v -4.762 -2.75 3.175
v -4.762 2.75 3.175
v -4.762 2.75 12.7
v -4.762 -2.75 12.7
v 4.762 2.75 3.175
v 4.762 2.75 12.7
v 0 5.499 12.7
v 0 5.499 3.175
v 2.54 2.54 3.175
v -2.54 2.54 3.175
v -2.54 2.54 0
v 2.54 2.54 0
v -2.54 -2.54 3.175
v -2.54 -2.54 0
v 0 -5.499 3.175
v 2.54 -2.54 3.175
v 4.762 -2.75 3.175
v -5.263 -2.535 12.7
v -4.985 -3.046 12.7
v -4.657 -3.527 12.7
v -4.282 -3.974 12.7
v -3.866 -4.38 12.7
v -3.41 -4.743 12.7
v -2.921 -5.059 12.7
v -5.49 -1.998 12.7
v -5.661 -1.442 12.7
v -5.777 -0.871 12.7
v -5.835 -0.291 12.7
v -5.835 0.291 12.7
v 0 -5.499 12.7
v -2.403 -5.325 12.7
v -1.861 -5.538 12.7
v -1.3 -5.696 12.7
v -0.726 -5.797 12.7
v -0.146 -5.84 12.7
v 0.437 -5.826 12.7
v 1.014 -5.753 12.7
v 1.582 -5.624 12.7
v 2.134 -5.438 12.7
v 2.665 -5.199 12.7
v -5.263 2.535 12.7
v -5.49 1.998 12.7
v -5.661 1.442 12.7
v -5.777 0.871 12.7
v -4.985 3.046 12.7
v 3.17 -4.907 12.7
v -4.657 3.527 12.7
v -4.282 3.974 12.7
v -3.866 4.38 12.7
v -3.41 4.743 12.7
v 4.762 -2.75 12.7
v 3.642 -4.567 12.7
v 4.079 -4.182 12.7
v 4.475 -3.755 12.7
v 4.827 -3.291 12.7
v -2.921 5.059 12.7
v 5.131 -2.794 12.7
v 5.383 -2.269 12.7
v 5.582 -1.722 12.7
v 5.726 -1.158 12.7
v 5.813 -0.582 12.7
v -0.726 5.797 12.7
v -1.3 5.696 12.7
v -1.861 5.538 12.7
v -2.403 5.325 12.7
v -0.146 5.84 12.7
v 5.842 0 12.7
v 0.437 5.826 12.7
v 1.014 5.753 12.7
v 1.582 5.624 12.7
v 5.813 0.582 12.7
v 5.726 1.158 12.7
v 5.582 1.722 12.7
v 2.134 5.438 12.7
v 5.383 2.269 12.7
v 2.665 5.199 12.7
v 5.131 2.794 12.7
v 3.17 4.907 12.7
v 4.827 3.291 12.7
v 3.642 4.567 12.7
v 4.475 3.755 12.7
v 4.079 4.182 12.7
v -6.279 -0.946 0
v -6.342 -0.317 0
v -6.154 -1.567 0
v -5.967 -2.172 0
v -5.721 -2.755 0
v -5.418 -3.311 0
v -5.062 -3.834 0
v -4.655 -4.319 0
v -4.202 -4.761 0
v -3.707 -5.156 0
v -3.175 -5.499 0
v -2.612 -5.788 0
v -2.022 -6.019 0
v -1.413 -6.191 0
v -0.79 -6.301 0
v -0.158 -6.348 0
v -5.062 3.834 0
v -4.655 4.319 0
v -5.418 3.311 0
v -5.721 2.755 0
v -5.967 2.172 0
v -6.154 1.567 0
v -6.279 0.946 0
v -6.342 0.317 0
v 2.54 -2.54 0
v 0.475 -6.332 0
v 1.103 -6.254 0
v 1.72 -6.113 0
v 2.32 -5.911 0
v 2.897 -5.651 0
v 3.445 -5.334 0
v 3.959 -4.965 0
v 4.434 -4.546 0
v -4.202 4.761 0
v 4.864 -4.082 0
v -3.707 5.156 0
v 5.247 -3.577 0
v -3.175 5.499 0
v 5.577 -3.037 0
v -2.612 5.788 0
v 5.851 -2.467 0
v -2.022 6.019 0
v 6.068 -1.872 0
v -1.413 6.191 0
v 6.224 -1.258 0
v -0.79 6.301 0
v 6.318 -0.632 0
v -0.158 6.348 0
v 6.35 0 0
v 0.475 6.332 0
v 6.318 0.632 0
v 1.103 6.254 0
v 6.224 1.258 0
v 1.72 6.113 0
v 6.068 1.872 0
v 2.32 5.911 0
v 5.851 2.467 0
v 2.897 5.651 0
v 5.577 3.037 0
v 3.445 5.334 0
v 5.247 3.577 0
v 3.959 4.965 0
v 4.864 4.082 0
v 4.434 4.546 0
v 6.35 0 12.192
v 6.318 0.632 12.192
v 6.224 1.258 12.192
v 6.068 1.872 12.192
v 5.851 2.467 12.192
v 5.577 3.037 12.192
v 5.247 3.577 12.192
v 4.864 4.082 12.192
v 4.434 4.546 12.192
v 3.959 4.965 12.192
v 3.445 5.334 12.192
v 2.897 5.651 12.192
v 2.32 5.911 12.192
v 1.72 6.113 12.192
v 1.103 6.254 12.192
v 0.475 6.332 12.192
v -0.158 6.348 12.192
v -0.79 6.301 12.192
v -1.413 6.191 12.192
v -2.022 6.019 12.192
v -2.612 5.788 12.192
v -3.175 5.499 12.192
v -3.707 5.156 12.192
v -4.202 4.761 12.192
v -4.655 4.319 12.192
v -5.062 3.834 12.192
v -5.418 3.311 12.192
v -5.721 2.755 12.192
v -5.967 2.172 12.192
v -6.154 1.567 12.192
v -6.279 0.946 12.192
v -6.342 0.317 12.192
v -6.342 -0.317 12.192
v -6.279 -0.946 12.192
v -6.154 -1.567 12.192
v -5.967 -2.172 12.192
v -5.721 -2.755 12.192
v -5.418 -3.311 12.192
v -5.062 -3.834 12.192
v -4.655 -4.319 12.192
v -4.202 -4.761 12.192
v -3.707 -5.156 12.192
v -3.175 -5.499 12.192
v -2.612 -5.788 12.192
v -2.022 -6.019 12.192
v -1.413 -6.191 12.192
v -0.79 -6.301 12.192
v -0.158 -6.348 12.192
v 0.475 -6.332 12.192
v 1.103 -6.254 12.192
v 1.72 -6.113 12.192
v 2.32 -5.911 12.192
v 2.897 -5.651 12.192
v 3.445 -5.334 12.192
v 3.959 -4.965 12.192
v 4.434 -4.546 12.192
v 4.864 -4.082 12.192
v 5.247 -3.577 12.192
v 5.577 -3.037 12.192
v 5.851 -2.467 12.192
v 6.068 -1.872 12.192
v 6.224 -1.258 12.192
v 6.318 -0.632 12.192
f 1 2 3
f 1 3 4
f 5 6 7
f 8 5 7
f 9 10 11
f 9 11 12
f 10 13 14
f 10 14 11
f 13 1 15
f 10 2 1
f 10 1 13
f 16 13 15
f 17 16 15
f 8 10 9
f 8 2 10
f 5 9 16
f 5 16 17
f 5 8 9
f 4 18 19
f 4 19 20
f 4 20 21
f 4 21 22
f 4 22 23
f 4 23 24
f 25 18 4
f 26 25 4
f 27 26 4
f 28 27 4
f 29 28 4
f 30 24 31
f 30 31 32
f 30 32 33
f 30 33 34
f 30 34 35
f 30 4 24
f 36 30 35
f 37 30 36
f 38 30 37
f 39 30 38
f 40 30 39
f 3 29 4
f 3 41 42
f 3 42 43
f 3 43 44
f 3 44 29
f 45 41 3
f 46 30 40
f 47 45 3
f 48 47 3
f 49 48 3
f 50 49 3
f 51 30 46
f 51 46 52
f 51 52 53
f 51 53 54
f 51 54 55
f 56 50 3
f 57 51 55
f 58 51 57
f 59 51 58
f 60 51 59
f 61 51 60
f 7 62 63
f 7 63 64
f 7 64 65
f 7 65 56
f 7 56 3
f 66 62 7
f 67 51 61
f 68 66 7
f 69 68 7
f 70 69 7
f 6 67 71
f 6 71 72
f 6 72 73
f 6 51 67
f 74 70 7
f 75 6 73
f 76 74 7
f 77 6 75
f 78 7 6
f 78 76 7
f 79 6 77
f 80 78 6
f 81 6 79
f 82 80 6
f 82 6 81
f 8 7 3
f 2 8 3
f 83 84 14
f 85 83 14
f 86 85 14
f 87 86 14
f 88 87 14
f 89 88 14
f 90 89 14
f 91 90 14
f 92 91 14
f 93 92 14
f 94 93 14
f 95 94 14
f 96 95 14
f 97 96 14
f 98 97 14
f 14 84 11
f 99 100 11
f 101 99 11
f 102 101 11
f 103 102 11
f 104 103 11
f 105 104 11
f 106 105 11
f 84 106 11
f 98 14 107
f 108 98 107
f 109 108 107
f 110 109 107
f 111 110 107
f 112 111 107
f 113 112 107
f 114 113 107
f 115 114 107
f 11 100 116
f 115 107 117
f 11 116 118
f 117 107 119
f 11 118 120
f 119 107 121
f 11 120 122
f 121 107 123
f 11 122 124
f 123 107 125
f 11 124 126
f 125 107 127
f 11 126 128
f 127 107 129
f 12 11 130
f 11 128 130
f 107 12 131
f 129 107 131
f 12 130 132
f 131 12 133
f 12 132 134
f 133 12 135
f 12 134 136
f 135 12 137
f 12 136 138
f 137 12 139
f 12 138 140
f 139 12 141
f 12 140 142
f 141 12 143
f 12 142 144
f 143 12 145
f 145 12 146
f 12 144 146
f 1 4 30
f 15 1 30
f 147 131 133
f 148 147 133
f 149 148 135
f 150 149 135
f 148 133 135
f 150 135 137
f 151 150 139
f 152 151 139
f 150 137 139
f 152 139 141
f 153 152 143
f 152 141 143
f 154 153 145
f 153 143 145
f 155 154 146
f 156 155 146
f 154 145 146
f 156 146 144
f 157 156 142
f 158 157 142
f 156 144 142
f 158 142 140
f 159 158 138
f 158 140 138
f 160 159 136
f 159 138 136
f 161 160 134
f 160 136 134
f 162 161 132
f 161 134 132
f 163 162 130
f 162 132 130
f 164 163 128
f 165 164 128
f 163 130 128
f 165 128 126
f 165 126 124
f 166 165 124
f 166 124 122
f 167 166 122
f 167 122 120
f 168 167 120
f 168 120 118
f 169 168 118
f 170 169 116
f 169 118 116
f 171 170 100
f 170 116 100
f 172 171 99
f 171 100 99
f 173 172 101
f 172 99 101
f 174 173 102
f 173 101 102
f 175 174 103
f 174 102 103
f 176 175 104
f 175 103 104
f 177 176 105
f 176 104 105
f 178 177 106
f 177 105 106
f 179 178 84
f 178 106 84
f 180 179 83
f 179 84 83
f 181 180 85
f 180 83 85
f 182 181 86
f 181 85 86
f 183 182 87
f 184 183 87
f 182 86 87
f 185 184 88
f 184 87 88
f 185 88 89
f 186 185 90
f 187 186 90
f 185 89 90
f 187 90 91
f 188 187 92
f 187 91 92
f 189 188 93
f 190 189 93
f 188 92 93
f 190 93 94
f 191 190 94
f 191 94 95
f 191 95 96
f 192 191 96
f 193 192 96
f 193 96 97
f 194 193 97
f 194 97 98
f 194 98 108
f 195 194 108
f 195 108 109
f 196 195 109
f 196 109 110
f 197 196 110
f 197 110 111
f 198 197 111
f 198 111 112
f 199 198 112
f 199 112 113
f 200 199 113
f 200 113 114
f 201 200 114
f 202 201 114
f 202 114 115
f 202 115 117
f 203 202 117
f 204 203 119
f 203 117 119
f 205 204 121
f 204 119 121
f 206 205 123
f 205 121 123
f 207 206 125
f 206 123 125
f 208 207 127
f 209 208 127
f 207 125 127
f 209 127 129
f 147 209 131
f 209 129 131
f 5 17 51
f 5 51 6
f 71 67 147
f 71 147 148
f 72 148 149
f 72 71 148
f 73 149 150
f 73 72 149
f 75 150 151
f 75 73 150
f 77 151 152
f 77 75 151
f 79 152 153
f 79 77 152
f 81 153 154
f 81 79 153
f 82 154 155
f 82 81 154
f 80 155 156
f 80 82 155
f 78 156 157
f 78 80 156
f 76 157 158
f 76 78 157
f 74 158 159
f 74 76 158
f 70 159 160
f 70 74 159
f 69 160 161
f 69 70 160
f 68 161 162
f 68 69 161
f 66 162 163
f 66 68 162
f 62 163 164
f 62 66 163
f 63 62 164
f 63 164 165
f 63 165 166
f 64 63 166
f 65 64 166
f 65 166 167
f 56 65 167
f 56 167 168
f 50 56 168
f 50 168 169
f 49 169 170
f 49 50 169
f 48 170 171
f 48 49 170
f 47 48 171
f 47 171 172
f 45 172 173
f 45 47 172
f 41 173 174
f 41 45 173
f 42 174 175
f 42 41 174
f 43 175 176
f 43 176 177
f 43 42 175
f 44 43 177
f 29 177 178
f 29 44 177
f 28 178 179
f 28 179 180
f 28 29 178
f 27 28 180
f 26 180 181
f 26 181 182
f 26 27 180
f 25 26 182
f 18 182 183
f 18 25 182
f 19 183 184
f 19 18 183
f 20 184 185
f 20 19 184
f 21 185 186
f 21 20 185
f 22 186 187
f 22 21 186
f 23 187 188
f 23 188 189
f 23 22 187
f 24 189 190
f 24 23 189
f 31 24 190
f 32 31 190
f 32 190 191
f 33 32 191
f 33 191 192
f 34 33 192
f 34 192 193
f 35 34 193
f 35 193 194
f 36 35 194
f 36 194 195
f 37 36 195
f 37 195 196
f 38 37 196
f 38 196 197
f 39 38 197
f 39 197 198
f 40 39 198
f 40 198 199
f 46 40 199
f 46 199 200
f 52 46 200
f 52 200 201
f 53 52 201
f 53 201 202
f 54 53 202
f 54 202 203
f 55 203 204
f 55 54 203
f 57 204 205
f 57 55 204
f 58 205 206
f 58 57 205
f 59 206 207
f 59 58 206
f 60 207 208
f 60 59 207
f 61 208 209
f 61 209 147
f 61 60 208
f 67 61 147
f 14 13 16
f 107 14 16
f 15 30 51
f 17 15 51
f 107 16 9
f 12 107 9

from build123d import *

# Parameters (mm, degrees)
SKETCH1_R           = 6.35
BOSS_EXTRUDE1_DEPTH = 12.7
CUT_EXTRUDE1_DEPTH  = 9.525
SKETCH3_W           = 5.08
SKETCH3_H           = 5.08
CUT_EXTRUDE2_DEPTH  = 9.525
CHAMFER1_SIZE       = 0.508


with BuildPart() as part:
    # Sketch1 → Boss-Extrude1 (new body)
    with BuildSketch(Plane.XY):
        Circle(SKETCH1_R)
    extrude(amount=BOSS_EXTRUDE1_DEPTH)

    # Sketch2 → Cut-Extrude1 (cut)
    with BuildSketch(Plane.XY.offset(12.7)):
        Polygon((0, -5.499261314), (4.7625, -2.749630657), (4.7625, 2.749630657), (0, 5.499261314), (-4.7625, 2.749630657), (-4.7625, -2.749630657), align=None)
    extrude(amount=-CUT_EXTRUDE1_DEPTH, mode=Mode.SUBTRACT)

    # Sketch3 → Cut-Extrude2 (cut)
    with BuildSketch(Plane.XY.offset(3.175)):
        Rectangle(SKETCH3_W, SKETCH3_H)
    extrude(amount=-CUT_EXTRUDE2_DEPTH, mode=Mode.SUBTRACT)

    # Chamfer1
    chamfer1_edges = [part.edges().sort_by_distance(p)[0] for p in [
        (-6.35, 0, 12.7),
    ]]
    chamfer(chamfer1_edges, length=CHAMFER1_SIZE)


solid = part.part
